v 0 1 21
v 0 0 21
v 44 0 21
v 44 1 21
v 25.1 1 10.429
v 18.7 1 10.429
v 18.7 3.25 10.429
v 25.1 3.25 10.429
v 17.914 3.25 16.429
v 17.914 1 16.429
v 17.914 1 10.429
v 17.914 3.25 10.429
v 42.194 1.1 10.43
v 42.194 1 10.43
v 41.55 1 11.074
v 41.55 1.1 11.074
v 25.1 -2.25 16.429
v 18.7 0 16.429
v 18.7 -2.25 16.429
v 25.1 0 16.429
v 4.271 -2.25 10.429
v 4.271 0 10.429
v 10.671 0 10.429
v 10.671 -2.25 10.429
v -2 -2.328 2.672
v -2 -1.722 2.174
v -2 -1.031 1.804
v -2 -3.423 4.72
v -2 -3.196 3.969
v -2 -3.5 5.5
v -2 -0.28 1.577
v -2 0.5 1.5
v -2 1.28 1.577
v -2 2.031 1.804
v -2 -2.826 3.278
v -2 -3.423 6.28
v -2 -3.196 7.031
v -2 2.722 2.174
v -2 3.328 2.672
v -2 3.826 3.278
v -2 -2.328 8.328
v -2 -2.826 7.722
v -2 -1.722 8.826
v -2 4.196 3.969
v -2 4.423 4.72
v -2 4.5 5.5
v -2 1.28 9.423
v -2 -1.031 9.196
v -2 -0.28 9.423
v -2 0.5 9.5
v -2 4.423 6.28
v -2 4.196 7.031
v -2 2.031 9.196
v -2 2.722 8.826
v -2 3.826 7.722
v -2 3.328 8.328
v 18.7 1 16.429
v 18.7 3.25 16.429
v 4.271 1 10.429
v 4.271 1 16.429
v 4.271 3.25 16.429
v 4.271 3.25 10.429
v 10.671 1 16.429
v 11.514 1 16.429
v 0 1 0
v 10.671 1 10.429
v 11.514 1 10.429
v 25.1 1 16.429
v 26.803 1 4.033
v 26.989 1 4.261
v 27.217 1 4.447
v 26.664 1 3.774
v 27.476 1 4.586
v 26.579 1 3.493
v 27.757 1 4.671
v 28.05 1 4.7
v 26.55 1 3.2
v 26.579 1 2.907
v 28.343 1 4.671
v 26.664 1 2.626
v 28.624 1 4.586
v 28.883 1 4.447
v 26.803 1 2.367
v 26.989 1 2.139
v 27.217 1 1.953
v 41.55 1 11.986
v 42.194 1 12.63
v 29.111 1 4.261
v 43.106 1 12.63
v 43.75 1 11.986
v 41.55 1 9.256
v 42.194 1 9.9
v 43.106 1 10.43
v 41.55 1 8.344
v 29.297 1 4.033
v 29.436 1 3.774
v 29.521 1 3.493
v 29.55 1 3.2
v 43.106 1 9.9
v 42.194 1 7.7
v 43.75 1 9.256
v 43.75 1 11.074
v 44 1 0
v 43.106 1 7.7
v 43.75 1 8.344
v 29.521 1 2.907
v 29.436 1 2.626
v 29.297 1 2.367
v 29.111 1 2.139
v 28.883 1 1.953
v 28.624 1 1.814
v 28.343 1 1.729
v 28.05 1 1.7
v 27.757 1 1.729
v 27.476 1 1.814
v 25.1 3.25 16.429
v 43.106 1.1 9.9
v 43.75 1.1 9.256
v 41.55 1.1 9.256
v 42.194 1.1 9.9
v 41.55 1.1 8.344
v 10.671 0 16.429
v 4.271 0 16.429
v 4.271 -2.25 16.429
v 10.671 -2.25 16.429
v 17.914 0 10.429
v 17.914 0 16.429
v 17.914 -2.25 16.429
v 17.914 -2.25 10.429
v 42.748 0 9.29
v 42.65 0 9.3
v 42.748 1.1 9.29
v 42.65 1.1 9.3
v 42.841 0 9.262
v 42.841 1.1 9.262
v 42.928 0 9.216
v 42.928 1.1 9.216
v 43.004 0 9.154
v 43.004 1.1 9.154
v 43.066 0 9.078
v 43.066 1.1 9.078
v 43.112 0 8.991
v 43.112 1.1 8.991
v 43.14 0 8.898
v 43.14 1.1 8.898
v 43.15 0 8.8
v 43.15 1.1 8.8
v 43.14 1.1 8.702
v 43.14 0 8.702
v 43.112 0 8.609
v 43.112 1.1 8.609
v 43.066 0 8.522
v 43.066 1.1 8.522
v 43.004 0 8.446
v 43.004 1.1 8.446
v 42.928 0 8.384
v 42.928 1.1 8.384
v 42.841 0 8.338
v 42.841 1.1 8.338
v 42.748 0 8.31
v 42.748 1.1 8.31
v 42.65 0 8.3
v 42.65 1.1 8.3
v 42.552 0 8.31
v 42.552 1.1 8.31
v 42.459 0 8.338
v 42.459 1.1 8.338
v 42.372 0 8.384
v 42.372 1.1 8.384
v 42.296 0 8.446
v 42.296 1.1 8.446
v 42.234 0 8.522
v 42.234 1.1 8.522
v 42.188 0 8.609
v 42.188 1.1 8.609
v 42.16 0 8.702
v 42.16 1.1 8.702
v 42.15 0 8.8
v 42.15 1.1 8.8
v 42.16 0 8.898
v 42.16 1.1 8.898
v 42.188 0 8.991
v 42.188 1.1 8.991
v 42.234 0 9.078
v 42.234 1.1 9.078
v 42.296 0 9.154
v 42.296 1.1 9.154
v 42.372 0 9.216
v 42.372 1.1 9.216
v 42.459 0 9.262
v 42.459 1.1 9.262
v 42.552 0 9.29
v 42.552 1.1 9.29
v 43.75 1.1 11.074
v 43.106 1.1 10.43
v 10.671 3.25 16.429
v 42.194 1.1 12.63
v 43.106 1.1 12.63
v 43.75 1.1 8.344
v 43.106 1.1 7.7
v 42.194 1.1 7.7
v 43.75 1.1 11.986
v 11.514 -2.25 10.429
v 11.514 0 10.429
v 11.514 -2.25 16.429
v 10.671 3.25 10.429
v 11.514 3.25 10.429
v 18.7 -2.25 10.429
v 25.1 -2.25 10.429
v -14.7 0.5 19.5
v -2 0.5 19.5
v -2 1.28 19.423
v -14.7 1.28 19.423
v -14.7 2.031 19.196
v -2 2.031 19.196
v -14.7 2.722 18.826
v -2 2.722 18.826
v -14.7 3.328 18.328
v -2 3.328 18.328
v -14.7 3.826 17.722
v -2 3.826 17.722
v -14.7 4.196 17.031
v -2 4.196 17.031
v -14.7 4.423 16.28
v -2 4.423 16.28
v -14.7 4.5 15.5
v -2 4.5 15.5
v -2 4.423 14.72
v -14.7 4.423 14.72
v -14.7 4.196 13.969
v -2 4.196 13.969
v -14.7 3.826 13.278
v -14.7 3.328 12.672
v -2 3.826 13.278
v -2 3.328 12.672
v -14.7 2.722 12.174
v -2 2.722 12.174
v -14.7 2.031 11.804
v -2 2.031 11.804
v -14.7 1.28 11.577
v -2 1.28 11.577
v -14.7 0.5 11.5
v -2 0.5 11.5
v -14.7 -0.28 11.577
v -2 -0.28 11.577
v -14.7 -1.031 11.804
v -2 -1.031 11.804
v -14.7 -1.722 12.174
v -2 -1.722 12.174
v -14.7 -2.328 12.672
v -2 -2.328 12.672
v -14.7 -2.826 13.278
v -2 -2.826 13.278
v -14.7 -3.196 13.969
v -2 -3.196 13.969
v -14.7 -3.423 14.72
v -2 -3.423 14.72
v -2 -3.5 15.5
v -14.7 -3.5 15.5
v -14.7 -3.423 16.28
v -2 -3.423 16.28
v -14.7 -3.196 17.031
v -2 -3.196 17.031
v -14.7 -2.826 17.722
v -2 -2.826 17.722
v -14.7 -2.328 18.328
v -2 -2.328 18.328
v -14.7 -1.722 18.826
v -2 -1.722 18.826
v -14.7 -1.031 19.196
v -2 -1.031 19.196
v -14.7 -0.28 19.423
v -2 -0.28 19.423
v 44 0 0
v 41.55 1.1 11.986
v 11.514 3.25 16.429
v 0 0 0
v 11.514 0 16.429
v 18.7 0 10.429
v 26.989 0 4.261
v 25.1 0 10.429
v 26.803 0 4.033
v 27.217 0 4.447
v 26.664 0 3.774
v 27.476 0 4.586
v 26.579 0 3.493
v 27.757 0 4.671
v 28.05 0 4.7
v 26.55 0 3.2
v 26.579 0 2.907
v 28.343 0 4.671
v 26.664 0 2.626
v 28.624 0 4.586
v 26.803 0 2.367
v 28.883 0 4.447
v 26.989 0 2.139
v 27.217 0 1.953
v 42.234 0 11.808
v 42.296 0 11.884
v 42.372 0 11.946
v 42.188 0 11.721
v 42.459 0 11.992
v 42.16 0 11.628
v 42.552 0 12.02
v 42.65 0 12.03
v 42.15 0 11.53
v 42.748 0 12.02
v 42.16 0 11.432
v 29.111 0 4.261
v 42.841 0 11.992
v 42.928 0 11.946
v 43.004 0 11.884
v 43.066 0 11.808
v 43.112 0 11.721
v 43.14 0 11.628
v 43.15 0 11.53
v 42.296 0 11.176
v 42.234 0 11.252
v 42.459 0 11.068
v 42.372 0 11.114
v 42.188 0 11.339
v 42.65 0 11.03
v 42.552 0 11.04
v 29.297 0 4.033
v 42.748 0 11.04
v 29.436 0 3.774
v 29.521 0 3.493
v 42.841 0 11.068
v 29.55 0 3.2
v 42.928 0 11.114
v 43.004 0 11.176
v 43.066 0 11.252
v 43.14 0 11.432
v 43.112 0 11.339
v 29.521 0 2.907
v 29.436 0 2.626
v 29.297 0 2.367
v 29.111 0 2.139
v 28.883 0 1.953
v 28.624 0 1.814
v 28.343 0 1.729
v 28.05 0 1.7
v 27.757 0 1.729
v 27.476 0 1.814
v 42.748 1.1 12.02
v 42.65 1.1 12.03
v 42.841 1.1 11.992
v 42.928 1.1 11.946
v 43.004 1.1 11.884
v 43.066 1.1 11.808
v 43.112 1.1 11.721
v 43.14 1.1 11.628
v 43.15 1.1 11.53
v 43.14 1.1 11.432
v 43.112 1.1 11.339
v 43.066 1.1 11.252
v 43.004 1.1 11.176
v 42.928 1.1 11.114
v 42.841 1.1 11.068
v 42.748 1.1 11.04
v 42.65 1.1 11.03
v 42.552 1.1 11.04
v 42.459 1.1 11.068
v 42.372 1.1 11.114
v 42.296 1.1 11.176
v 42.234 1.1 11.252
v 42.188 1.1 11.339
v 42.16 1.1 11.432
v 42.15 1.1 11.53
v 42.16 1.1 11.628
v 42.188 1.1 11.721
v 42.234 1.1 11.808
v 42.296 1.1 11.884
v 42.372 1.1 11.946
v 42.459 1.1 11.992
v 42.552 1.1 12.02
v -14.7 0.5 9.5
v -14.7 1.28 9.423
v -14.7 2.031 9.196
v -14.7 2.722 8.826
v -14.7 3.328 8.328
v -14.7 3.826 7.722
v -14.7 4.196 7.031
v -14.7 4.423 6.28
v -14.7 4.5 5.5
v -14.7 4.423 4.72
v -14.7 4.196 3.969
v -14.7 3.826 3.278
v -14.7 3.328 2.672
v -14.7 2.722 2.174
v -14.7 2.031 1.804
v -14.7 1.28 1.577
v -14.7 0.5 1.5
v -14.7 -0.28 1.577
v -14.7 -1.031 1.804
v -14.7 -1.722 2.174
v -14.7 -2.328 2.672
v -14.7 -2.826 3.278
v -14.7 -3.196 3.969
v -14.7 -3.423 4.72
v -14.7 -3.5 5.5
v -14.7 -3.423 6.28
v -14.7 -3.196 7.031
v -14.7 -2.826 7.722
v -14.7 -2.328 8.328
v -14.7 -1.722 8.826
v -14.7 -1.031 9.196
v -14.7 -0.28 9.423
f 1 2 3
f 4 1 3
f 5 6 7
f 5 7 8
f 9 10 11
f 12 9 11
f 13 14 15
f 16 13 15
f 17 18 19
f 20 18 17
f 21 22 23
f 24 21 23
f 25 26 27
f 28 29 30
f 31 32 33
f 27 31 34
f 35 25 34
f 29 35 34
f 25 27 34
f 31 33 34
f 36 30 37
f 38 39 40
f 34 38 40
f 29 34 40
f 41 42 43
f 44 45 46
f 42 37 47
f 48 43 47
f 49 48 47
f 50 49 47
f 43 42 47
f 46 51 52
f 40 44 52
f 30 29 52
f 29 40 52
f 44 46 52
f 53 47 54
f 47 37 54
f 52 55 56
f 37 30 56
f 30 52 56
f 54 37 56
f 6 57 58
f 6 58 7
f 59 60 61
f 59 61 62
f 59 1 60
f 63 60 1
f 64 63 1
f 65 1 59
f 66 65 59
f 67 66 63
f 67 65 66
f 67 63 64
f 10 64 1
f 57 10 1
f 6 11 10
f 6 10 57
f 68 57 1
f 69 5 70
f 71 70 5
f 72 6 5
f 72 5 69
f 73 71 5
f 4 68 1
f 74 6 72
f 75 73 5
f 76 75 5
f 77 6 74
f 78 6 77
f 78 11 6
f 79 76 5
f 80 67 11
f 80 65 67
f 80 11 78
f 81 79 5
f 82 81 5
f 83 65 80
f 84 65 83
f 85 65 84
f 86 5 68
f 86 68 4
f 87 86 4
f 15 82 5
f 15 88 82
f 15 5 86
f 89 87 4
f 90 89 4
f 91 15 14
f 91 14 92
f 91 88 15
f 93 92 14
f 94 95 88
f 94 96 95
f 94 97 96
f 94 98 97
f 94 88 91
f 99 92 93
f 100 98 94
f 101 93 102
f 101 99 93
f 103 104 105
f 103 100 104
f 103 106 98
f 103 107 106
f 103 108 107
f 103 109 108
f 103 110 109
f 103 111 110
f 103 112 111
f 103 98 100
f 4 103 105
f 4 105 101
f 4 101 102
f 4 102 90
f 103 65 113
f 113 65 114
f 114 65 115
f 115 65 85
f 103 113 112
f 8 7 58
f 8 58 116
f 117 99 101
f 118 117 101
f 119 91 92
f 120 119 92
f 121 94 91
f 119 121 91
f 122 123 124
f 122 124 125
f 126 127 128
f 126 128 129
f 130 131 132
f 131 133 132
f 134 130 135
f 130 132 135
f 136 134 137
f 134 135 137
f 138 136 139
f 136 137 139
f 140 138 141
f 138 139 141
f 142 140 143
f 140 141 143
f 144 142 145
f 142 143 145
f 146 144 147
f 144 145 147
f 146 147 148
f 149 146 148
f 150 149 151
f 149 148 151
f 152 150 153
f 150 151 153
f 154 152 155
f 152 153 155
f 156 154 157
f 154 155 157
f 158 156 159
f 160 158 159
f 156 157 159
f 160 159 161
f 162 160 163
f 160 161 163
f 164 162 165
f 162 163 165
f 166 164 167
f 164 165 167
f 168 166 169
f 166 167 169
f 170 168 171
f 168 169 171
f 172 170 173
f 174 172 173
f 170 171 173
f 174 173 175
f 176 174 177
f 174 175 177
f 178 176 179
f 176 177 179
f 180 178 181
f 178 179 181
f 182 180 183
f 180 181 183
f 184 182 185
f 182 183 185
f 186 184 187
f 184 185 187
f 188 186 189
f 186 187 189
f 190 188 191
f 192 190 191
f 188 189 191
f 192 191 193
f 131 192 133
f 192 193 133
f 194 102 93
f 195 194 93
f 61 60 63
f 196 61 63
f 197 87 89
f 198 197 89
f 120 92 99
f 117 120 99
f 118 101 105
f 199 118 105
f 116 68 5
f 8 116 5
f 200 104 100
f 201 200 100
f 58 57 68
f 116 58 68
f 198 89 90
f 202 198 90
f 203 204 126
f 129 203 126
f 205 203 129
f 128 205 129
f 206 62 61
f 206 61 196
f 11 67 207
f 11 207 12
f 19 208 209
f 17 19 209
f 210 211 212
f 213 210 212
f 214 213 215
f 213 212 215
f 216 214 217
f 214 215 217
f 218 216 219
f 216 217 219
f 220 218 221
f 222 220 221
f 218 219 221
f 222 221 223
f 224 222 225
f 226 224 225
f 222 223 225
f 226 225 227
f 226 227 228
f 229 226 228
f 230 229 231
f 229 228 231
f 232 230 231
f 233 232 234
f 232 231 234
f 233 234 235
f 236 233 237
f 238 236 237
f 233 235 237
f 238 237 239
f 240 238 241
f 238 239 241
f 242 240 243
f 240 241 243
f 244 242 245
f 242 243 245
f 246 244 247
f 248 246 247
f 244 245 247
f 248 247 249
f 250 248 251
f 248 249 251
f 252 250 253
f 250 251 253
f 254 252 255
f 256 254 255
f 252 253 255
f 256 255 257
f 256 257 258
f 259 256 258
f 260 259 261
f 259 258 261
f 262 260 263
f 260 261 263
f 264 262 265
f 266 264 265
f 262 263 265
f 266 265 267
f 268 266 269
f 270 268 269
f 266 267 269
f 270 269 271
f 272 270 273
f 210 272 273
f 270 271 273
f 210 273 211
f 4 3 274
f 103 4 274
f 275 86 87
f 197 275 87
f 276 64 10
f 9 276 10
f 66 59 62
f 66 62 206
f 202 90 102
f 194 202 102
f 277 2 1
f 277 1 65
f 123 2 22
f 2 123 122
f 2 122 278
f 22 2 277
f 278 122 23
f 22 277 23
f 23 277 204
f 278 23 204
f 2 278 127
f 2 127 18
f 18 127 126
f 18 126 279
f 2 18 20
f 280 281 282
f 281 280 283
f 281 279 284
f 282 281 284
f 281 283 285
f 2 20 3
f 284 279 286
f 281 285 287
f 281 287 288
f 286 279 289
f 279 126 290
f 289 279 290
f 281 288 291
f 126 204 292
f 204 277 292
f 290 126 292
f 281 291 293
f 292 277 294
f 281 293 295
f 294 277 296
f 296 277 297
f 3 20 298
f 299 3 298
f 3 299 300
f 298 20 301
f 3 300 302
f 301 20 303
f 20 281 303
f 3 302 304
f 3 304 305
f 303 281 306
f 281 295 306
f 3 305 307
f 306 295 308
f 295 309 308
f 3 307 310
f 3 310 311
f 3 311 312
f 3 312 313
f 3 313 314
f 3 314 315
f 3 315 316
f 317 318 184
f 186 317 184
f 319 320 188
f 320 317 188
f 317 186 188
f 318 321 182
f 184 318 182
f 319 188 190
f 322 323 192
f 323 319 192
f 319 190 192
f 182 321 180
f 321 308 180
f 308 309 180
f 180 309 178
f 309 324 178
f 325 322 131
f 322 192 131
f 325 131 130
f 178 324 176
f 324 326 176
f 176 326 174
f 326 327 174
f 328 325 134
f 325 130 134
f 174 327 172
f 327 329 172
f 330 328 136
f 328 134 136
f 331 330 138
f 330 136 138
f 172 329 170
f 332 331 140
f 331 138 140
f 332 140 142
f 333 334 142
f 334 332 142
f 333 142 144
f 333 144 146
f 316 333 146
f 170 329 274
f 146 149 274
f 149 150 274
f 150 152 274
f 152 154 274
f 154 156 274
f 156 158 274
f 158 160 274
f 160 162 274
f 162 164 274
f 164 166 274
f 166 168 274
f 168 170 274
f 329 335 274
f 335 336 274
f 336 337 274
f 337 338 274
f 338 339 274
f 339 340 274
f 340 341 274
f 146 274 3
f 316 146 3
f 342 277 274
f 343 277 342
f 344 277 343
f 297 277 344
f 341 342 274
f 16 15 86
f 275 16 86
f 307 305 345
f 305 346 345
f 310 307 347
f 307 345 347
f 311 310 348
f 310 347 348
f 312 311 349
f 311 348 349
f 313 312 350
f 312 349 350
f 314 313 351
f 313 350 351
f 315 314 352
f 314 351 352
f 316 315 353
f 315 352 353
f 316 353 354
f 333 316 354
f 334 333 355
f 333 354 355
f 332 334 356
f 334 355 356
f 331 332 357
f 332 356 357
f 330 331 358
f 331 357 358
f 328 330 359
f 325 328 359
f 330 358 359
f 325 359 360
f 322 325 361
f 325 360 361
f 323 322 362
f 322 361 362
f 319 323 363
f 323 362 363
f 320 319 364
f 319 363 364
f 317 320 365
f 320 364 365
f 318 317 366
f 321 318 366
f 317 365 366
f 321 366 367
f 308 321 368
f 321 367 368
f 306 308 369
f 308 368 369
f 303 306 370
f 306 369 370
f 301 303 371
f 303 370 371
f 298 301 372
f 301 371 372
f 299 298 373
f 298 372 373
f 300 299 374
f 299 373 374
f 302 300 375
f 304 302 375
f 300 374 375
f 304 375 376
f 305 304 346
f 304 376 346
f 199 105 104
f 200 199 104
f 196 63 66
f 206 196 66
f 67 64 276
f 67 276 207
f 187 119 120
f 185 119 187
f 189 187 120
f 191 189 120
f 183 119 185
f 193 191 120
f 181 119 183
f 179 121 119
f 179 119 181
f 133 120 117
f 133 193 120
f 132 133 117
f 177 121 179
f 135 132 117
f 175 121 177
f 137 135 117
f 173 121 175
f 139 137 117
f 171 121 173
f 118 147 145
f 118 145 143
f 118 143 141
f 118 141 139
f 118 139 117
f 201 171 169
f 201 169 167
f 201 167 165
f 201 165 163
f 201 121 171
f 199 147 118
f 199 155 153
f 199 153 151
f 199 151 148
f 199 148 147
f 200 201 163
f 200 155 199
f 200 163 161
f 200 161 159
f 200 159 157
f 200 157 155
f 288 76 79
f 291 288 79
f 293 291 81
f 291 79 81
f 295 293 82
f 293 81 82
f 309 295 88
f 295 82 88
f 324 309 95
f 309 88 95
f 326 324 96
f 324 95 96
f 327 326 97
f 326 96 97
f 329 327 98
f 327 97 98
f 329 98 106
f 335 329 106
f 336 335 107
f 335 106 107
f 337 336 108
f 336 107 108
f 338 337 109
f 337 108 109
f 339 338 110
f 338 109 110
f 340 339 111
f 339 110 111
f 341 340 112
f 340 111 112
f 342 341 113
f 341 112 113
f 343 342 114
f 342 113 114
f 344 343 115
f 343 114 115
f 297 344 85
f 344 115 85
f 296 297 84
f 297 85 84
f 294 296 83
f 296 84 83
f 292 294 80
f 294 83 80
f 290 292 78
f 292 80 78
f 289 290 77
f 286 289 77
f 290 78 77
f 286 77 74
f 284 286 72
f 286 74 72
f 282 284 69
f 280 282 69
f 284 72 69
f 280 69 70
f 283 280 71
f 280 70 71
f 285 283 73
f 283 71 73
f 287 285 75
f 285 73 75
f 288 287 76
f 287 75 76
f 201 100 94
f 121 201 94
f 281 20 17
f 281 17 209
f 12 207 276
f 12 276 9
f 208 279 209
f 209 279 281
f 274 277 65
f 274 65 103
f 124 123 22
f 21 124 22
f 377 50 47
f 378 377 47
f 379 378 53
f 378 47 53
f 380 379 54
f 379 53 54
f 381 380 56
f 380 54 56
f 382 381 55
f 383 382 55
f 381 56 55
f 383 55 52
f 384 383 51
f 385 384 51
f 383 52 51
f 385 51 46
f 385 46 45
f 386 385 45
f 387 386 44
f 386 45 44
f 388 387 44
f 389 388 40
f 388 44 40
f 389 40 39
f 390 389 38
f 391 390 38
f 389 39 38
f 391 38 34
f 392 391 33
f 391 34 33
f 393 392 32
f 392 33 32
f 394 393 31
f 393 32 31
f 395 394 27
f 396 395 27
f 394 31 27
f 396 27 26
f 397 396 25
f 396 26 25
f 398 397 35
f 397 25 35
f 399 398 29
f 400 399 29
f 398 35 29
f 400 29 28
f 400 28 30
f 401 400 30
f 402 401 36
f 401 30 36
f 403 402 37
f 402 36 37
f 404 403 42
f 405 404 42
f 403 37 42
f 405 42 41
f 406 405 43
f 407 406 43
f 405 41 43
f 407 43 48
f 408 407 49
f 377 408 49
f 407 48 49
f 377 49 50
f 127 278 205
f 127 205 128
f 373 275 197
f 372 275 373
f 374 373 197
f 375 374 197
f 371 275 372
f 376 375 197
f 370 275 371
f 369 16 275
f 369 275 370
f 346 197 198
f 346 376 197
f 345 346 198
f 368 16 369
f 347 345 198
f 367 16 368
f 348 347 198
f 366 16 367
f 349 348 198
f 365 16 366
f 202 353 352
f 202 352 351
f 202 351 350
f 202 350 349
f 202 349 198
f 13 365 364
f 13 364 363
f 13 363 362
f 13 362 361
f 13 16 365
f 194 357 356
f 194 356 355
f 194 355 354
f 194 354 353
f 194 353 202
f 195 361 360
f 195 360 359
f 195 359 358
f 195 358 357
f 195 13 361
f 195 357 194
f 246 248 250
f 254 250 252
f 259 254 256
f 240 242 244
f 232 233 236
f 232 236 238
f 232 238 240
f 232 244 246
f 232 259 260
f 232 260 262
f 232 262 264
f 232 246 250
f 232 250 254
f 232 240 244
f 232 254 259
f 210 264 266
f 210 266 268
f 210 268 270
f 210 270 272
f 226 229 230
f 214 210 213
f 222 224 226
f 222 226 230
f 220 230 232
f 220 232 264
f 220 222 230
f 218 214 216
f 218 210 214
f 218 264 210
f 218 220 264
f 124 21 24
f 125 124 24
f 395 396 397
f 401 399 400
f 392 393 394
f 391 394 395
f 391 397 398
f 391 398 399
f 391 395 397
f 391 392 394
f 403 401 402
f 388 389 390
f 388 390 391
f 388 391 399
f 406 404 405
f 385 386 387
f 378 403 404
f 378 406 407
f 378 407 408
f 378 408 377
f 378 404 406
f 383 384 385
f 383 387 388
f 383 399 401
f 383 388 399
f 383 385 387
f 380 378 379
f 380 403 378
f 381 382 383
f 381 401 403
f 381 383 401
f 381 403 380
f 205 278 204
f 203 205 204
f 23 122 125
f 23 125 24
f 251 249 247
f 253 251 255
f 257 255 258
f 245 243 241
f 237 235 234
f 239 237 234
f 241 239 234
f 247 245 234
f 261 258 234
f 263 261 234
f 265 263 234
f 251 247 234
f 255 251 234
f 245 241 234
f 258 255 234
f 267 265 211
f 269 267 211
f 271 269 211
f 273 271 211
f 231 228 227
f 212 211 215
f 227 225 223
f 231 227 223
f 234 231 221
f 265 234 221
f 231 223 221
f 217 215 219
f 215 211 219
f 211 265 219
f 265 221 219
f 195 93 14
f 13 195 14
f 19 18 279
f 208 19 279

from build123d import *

# Parameters (mm, degrees)
SKETCH_1_W               = 44
SKETCH_1_H               = 21
EXTRUDE_1_DEPTH          = 1
EXTRUDE_3_DEPTH          = 0.1
SKETCH_2_R               = 1.5
SKETCH_2_R_2             = 0.5
CUT_EXTRUDE_1_DEPTH      = 1
CUT_EXTRUDE_1_DEPTH_BACK = 1
SKETCH_3_W               = 6.4
SKETCH_3_H               = 6
EXTRUDE_2_DEPTH          = 2.25
EXTRUDE_2_DEPTH_BACK     = 3.25
EXTRUDE_START            = 2
SKETCH_5_R               = 4
EXTRUDE_4_DEPTH          = 12.7
EXTRUDE_4_2_DEPTH        = 12.7


with BuildPart() as part:
    # Эскиз1 → Бобышка-Вытянуть1 (new body)
    with BuildSketch(Plane(origin=(0, 0, 0), x_dir=(1, 0, 0), z_dir=(0, 1, 0))):
        with Locations((22, -10.5)):
            Rectangle(SKETCH_1_W, SKETCH_1_H)
    extrude(amount=EXTRUDE_1_DEPTH)

    # Эскиз4 → Бобышка-Вытянуть3 (add)
    with BuildSketch(Plane(origin=(0, 1, 0), x_dir=(1, 0, 0), z_dir=(0, 1, 0))):
        Polygon((43.75, -8.344365081), (43.105634919, -7.7), (42.194365081, -7.7), (41.55, -8.344365081), (41.55, -9.255634919), (42.194365081, -9.9), (43.105634919, -9.9), (43.75, -9.255634919), align=None)
        Polygon((41.55, -11.074365081), (41.55, -11.985634919), (42.194365081, -12.63), (43.105634919, -12.63), (43.75, -11.985634919), (43.75, -11.074365081), (43.105634919, -10.43), (42.194365081, -10.43), align=None)
    extrude(amount=EXTRUDE_3_DEPTH)

    # Эскиз2 → Вырез-Вытянуть1 (cut, two sides)
    with BuildSketch(Plane(origin=(0, 1, 0), x_dir=(1, 0, 0), z_dir=(0, 1, 0))) as cut_extrude_1_sk:
        with Locations(Location((28.05, -3.2, 0), (0, 0, 270))):  # turned: the seam where the file's is
            Circle(SKETCH_2_R)
        with Locations(Location((42.65, -8.8, 0), (0, 0, 270))):  # turned: the seam where the file's is
            Circle(SKETCH_2_R_2)
        with Locations(Location((42.65, -11.53, 0), (0, 0, 270))):  # turned: the seam where the file's is
            Circle(SKETCH_2_R_2)
    extrude(amount=CUT_EXTRUDE_1_DEPTH, mode=Mode.SUBTRACT)
    extrude(cut_extrude_1_sk.sketch, amount=-CUT_EXTRUDE_1_DEPTH_BACK, mode=Mode.SUBTRACT)

    # Эскиз3 → Бобышка-Вытянуть2 (add, two sides)
    with BuildSketch(Plane(origin=(0, 1, 0), x_dir=(1, 0, 0), z_dir=(0, 1, 0))) as extrude_2_sk:
        with Locations((7.471, -13.429)):
            Rectangle(SKETCH_3_W, SKETCH_3_H)
        with Locations((14.714, -13.429)):
            Rectangle(SKETCH_3_W, SKETCH_3_H)
        with Locations((21.9, -13.429)):
            Rectangle(SKETCH_3_W, SKETCH_3_H)
    extrude(amount=EXTRUDE_2_DEPTH)
    extrude(extrude_2_sk.sketch, amount=-EXTRUDE_2_DEPTH_BACK)


with BuildPart() as body_2:
    # Эскиз5 → Бобышка-Вытянуть4 (new body)
    with BuildSketch(Plane.ZY.offset(EXTRUDE_START)):
        with Locations((5.5, 0.5)):
            Circle(SKETCH_5_R)
    extrude(amount=EXTRUDE_4_DEPTH)


with BuildPart() as body_3:
    # Эскиз5 → Extrude 4 2 (new body)
    with BuildSketch(Plane.ZY.offset(EXTRUDE_START)):
        with Locations((15.5, 0.5)):
            Circle(SKETCH_5_R)
    extrude(amount=EXTRUDE_4_2_DEPTH)


solid = Compound([part.part, body_2.part, body_3.part])
